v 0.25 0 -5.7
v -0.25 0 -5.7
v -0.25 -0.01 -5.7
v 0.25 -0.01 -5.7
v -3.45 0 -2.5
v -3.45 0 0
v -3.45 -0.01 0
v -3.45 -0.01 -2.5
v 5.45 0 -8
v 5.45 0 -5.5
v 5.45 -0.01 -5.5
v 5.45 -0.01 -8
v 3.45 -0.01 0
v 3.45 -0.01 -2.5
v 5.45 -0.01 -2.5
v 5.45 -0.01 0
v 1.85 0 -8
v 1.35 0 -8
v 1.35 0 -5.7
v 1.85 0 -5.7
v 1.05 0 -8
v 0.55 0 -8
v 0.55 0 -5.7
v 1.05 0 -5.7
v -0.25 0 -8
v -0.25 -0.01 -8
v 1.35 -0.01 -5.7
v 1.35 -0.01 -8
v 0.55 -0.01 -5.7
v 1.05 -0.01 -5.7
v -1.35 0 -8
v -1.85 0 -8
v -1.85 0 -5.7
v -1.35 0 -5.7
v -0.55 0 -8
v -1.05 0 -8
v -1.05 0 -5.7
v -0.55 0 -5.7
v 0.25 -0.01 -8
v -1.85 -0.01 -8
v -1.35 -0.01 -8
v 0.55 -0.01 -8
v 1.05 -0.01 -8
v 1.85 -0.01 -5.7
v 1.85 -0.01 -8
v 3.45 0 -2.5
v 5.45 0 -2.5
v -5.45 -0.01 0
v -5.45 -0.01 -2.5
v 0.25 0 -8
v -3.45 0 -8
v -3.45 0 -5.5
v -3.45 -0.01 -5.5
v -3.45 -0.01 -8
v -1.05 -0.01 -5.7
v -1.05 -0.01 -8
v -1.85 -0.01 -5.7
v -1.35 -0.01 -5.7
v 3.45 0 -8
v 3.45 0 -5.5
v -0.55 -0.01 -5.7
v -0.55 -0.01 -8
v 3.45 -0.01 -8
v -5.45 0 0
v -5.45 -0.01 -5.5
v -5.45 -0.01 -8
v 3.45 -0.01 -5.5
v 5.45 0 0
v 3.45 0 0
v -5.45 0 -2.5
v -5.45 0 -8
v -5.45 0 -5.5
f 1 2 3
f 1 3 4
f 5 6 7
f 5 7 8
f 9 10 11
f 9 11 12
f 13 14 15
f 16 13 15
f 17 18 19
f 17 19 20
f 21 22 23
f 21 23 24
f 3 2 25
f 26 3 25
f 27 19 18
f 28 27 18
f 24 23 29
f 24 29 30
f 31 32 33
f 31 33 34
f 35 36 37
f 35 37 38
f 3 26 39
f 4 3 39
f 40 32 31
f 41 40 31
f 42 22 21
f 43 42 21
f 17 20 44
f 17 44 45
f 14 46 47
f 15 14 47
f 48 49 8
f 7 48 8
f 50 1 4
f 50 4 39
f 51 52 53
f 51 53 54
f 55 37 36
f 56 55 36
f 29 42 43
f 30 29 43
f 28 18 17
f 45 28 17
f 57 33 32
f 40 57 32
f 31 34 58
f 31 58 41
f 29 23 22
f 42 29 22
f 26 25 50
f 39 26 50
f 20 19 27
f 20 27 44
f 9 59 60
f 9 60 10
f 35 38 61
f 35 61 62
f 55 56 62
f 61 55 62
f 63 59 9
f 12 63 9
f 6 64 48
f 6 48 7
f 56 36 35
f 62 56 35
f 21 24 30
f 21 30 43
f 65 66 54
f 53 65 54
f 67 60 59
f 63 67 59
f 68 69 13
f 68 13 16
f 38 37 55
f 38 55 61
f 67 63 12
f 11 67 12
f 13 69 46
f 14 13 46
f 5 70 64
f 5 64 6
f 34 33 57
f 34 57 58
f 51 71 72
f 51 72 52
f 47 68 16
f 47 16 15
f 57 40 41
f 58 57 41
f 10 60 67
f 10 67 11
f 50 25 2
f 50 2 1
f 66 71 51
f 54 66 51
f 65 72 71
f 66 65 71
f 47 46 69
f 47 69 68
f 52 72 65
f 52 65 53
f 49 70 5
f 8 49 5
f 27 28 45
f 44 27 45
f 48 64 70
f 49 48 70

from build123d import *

# Parameters (mm, degrees)
SKETCH1_W             = 2
SKETCH1_H             = 2.5
BOSS_EXTRUDE1_DEPTH   = 0.01
BOSS_EXTRUDE1_2_DEPTH = 0.01
BOSS_EXTRUDE1_3_DEPTH = 0.01
BOSS_EXTRUDE1_4_DEPTH = 0.01
SKETCH1_W_2           = 0.5
SKETCH1_H_2           = 2.3
BOSS_EXTRUDE1_5_DEPTH = 0.01
BOSS_EXTRUDE1_6_DEPTH = 0.01
BOSS_EXTRUDE1_7_DEPTH = 0.01
BOSS_EXTRUDE1_8_DEPTH = 0.01
BOSS_EXTRUDE1_9_DEPTH = 0.01


with BuildPart() as part:
    # Sketch1 → Boss-Extrude1 (new body)
    with BuildSketch(Plane(origin=(0, 0, 0), x_dir=(1, 0, 0), z_dir=(0, 1, 0))):
        with Locations((-4.45, 6.75)):
            Rectangle(SKETCH1_W, SKETCH1_H)
    extrude(amount=-BOSS_EXTRUDE1_DEPTH)


with BuildPart() as body_2:
    # Sketch1 → Boss-Extrude1 2 (new body)
    with BuildSketch(Plane(origin=(0, 0, 0), x_dir=(1, 0, 0), z_dir=(0, 1, 0))):
        with Locations((-4.45, 1.25)):
            Rectangle(SKETCH1_W, SKETCH1_H)
    extrude(amount=-BOSS_EXTRUDE1_2_DEPTH)


with BuildPart() as body_3:
    # Sketch1 → Boss-Extrude1 3 (new body)
    with BuildSketch(Plane(origin=(0, 0, 0), x_dir=(1, 0, 0), z_dir=(0, 1, 0))):
        with Locations((4.45, 6.75)):
            Rectangle(SKETCH1_W, SKETCH1_H)
    extrude(amount=-BOSS_EXTRUDE1_3_DEPTH)


with BuildPart() as body_4:
    # Sketch1 → Boss-Extrude1 4 (new body)
    with BuildSketch(Plane(origin=(0, 0, 0), x_dir=(1, 0, 0), z_dir=(0, 1, 0))):
        with Locations((4.45, 1.25)):
            Rectangle(SKETCH1_W, SKETCH1_H)
    extrude(amount=-BOSS_EXTRUDE1_4_DEPTH)


with BuildPart() as body_5:
    # Sketch1 → Boss-Extrude1 5 (new body)
    with BuildSketch(Plane(origin=(0, 0, 0), x_dir=(1, 0, 0), z_dir=(0, 1, 0))):
        with Locations((-1.6, 6.85)):
            Rectangle(SKETCH1_W_2, SKETCH1_H_2)
    extrude(amount=-BOSS_EXTRUDE1_5_DEPTH)


with BuildPart() as body_6:
    # Sketch1 → Boss-Extrude1 6 (new body)
    with BuildSketch(Plane(origin=(0, 0, 0), x_dir=(1, 0, 0), z_dir=(0, 1, 0))):
        with Locations((-0.8, 6.85)):
            Rectangle(SKETCH1_W_2, SKETCH1_H_2)
    extrude(amount=-BOSS_EXTRUDE1_6_DEPTH)


with BuildPart() as body_7:
    # Sketch1 → Boss-Extrude1 7 (new body)
    with BuildSketch(Plane(origin=(0, 0, 0), x_dir=(1, 0, 0), z_dir=(0, 1, 0))):
        with Locations((0, 6.85)):
            Rectangle(SKETCH1_W_2, SKETCH1_H_2)
    extrude(amount=-BOSS_EXTRUDE1_7_DEPTH)


with BuildPart() as body_8:
    # Sketch1 → Boss-Extrude1 8 (new body)
    with BuildSketch(Plane(origin=(0, 0, 0), x_dir=(1, 0, 0), z_dir=(0, 1, 0))):
        with Locations((0.8, 6.85)):
            Rectangle(SKETCH1_W_2, SKETCH1_H_2)
    extrude(amount=-BOSS_EXTRUDE1_8_DEPTH)


with BuildPart() as body_9:
    # Sketch1 → Boss-Extrude1 9 (new body)
    with BuildSketch(Plane(origin=(0, 0, 0), x_dir=(1, 0, 0), z_dir=(0, 1, 0))):
        with Locations((1.6, 6.85)):
            Rectangle(SKETCH1_W_2, SKETCH1_H_2)
    extrude(amount=-BOSS_EXTRUDE1_9_DEPTH)


solid = Compound([part.part, body_2.part, body_3.part, body_4.part, body_5.part, body_6.part, body_7.part, body_8.part, body_9.part])
